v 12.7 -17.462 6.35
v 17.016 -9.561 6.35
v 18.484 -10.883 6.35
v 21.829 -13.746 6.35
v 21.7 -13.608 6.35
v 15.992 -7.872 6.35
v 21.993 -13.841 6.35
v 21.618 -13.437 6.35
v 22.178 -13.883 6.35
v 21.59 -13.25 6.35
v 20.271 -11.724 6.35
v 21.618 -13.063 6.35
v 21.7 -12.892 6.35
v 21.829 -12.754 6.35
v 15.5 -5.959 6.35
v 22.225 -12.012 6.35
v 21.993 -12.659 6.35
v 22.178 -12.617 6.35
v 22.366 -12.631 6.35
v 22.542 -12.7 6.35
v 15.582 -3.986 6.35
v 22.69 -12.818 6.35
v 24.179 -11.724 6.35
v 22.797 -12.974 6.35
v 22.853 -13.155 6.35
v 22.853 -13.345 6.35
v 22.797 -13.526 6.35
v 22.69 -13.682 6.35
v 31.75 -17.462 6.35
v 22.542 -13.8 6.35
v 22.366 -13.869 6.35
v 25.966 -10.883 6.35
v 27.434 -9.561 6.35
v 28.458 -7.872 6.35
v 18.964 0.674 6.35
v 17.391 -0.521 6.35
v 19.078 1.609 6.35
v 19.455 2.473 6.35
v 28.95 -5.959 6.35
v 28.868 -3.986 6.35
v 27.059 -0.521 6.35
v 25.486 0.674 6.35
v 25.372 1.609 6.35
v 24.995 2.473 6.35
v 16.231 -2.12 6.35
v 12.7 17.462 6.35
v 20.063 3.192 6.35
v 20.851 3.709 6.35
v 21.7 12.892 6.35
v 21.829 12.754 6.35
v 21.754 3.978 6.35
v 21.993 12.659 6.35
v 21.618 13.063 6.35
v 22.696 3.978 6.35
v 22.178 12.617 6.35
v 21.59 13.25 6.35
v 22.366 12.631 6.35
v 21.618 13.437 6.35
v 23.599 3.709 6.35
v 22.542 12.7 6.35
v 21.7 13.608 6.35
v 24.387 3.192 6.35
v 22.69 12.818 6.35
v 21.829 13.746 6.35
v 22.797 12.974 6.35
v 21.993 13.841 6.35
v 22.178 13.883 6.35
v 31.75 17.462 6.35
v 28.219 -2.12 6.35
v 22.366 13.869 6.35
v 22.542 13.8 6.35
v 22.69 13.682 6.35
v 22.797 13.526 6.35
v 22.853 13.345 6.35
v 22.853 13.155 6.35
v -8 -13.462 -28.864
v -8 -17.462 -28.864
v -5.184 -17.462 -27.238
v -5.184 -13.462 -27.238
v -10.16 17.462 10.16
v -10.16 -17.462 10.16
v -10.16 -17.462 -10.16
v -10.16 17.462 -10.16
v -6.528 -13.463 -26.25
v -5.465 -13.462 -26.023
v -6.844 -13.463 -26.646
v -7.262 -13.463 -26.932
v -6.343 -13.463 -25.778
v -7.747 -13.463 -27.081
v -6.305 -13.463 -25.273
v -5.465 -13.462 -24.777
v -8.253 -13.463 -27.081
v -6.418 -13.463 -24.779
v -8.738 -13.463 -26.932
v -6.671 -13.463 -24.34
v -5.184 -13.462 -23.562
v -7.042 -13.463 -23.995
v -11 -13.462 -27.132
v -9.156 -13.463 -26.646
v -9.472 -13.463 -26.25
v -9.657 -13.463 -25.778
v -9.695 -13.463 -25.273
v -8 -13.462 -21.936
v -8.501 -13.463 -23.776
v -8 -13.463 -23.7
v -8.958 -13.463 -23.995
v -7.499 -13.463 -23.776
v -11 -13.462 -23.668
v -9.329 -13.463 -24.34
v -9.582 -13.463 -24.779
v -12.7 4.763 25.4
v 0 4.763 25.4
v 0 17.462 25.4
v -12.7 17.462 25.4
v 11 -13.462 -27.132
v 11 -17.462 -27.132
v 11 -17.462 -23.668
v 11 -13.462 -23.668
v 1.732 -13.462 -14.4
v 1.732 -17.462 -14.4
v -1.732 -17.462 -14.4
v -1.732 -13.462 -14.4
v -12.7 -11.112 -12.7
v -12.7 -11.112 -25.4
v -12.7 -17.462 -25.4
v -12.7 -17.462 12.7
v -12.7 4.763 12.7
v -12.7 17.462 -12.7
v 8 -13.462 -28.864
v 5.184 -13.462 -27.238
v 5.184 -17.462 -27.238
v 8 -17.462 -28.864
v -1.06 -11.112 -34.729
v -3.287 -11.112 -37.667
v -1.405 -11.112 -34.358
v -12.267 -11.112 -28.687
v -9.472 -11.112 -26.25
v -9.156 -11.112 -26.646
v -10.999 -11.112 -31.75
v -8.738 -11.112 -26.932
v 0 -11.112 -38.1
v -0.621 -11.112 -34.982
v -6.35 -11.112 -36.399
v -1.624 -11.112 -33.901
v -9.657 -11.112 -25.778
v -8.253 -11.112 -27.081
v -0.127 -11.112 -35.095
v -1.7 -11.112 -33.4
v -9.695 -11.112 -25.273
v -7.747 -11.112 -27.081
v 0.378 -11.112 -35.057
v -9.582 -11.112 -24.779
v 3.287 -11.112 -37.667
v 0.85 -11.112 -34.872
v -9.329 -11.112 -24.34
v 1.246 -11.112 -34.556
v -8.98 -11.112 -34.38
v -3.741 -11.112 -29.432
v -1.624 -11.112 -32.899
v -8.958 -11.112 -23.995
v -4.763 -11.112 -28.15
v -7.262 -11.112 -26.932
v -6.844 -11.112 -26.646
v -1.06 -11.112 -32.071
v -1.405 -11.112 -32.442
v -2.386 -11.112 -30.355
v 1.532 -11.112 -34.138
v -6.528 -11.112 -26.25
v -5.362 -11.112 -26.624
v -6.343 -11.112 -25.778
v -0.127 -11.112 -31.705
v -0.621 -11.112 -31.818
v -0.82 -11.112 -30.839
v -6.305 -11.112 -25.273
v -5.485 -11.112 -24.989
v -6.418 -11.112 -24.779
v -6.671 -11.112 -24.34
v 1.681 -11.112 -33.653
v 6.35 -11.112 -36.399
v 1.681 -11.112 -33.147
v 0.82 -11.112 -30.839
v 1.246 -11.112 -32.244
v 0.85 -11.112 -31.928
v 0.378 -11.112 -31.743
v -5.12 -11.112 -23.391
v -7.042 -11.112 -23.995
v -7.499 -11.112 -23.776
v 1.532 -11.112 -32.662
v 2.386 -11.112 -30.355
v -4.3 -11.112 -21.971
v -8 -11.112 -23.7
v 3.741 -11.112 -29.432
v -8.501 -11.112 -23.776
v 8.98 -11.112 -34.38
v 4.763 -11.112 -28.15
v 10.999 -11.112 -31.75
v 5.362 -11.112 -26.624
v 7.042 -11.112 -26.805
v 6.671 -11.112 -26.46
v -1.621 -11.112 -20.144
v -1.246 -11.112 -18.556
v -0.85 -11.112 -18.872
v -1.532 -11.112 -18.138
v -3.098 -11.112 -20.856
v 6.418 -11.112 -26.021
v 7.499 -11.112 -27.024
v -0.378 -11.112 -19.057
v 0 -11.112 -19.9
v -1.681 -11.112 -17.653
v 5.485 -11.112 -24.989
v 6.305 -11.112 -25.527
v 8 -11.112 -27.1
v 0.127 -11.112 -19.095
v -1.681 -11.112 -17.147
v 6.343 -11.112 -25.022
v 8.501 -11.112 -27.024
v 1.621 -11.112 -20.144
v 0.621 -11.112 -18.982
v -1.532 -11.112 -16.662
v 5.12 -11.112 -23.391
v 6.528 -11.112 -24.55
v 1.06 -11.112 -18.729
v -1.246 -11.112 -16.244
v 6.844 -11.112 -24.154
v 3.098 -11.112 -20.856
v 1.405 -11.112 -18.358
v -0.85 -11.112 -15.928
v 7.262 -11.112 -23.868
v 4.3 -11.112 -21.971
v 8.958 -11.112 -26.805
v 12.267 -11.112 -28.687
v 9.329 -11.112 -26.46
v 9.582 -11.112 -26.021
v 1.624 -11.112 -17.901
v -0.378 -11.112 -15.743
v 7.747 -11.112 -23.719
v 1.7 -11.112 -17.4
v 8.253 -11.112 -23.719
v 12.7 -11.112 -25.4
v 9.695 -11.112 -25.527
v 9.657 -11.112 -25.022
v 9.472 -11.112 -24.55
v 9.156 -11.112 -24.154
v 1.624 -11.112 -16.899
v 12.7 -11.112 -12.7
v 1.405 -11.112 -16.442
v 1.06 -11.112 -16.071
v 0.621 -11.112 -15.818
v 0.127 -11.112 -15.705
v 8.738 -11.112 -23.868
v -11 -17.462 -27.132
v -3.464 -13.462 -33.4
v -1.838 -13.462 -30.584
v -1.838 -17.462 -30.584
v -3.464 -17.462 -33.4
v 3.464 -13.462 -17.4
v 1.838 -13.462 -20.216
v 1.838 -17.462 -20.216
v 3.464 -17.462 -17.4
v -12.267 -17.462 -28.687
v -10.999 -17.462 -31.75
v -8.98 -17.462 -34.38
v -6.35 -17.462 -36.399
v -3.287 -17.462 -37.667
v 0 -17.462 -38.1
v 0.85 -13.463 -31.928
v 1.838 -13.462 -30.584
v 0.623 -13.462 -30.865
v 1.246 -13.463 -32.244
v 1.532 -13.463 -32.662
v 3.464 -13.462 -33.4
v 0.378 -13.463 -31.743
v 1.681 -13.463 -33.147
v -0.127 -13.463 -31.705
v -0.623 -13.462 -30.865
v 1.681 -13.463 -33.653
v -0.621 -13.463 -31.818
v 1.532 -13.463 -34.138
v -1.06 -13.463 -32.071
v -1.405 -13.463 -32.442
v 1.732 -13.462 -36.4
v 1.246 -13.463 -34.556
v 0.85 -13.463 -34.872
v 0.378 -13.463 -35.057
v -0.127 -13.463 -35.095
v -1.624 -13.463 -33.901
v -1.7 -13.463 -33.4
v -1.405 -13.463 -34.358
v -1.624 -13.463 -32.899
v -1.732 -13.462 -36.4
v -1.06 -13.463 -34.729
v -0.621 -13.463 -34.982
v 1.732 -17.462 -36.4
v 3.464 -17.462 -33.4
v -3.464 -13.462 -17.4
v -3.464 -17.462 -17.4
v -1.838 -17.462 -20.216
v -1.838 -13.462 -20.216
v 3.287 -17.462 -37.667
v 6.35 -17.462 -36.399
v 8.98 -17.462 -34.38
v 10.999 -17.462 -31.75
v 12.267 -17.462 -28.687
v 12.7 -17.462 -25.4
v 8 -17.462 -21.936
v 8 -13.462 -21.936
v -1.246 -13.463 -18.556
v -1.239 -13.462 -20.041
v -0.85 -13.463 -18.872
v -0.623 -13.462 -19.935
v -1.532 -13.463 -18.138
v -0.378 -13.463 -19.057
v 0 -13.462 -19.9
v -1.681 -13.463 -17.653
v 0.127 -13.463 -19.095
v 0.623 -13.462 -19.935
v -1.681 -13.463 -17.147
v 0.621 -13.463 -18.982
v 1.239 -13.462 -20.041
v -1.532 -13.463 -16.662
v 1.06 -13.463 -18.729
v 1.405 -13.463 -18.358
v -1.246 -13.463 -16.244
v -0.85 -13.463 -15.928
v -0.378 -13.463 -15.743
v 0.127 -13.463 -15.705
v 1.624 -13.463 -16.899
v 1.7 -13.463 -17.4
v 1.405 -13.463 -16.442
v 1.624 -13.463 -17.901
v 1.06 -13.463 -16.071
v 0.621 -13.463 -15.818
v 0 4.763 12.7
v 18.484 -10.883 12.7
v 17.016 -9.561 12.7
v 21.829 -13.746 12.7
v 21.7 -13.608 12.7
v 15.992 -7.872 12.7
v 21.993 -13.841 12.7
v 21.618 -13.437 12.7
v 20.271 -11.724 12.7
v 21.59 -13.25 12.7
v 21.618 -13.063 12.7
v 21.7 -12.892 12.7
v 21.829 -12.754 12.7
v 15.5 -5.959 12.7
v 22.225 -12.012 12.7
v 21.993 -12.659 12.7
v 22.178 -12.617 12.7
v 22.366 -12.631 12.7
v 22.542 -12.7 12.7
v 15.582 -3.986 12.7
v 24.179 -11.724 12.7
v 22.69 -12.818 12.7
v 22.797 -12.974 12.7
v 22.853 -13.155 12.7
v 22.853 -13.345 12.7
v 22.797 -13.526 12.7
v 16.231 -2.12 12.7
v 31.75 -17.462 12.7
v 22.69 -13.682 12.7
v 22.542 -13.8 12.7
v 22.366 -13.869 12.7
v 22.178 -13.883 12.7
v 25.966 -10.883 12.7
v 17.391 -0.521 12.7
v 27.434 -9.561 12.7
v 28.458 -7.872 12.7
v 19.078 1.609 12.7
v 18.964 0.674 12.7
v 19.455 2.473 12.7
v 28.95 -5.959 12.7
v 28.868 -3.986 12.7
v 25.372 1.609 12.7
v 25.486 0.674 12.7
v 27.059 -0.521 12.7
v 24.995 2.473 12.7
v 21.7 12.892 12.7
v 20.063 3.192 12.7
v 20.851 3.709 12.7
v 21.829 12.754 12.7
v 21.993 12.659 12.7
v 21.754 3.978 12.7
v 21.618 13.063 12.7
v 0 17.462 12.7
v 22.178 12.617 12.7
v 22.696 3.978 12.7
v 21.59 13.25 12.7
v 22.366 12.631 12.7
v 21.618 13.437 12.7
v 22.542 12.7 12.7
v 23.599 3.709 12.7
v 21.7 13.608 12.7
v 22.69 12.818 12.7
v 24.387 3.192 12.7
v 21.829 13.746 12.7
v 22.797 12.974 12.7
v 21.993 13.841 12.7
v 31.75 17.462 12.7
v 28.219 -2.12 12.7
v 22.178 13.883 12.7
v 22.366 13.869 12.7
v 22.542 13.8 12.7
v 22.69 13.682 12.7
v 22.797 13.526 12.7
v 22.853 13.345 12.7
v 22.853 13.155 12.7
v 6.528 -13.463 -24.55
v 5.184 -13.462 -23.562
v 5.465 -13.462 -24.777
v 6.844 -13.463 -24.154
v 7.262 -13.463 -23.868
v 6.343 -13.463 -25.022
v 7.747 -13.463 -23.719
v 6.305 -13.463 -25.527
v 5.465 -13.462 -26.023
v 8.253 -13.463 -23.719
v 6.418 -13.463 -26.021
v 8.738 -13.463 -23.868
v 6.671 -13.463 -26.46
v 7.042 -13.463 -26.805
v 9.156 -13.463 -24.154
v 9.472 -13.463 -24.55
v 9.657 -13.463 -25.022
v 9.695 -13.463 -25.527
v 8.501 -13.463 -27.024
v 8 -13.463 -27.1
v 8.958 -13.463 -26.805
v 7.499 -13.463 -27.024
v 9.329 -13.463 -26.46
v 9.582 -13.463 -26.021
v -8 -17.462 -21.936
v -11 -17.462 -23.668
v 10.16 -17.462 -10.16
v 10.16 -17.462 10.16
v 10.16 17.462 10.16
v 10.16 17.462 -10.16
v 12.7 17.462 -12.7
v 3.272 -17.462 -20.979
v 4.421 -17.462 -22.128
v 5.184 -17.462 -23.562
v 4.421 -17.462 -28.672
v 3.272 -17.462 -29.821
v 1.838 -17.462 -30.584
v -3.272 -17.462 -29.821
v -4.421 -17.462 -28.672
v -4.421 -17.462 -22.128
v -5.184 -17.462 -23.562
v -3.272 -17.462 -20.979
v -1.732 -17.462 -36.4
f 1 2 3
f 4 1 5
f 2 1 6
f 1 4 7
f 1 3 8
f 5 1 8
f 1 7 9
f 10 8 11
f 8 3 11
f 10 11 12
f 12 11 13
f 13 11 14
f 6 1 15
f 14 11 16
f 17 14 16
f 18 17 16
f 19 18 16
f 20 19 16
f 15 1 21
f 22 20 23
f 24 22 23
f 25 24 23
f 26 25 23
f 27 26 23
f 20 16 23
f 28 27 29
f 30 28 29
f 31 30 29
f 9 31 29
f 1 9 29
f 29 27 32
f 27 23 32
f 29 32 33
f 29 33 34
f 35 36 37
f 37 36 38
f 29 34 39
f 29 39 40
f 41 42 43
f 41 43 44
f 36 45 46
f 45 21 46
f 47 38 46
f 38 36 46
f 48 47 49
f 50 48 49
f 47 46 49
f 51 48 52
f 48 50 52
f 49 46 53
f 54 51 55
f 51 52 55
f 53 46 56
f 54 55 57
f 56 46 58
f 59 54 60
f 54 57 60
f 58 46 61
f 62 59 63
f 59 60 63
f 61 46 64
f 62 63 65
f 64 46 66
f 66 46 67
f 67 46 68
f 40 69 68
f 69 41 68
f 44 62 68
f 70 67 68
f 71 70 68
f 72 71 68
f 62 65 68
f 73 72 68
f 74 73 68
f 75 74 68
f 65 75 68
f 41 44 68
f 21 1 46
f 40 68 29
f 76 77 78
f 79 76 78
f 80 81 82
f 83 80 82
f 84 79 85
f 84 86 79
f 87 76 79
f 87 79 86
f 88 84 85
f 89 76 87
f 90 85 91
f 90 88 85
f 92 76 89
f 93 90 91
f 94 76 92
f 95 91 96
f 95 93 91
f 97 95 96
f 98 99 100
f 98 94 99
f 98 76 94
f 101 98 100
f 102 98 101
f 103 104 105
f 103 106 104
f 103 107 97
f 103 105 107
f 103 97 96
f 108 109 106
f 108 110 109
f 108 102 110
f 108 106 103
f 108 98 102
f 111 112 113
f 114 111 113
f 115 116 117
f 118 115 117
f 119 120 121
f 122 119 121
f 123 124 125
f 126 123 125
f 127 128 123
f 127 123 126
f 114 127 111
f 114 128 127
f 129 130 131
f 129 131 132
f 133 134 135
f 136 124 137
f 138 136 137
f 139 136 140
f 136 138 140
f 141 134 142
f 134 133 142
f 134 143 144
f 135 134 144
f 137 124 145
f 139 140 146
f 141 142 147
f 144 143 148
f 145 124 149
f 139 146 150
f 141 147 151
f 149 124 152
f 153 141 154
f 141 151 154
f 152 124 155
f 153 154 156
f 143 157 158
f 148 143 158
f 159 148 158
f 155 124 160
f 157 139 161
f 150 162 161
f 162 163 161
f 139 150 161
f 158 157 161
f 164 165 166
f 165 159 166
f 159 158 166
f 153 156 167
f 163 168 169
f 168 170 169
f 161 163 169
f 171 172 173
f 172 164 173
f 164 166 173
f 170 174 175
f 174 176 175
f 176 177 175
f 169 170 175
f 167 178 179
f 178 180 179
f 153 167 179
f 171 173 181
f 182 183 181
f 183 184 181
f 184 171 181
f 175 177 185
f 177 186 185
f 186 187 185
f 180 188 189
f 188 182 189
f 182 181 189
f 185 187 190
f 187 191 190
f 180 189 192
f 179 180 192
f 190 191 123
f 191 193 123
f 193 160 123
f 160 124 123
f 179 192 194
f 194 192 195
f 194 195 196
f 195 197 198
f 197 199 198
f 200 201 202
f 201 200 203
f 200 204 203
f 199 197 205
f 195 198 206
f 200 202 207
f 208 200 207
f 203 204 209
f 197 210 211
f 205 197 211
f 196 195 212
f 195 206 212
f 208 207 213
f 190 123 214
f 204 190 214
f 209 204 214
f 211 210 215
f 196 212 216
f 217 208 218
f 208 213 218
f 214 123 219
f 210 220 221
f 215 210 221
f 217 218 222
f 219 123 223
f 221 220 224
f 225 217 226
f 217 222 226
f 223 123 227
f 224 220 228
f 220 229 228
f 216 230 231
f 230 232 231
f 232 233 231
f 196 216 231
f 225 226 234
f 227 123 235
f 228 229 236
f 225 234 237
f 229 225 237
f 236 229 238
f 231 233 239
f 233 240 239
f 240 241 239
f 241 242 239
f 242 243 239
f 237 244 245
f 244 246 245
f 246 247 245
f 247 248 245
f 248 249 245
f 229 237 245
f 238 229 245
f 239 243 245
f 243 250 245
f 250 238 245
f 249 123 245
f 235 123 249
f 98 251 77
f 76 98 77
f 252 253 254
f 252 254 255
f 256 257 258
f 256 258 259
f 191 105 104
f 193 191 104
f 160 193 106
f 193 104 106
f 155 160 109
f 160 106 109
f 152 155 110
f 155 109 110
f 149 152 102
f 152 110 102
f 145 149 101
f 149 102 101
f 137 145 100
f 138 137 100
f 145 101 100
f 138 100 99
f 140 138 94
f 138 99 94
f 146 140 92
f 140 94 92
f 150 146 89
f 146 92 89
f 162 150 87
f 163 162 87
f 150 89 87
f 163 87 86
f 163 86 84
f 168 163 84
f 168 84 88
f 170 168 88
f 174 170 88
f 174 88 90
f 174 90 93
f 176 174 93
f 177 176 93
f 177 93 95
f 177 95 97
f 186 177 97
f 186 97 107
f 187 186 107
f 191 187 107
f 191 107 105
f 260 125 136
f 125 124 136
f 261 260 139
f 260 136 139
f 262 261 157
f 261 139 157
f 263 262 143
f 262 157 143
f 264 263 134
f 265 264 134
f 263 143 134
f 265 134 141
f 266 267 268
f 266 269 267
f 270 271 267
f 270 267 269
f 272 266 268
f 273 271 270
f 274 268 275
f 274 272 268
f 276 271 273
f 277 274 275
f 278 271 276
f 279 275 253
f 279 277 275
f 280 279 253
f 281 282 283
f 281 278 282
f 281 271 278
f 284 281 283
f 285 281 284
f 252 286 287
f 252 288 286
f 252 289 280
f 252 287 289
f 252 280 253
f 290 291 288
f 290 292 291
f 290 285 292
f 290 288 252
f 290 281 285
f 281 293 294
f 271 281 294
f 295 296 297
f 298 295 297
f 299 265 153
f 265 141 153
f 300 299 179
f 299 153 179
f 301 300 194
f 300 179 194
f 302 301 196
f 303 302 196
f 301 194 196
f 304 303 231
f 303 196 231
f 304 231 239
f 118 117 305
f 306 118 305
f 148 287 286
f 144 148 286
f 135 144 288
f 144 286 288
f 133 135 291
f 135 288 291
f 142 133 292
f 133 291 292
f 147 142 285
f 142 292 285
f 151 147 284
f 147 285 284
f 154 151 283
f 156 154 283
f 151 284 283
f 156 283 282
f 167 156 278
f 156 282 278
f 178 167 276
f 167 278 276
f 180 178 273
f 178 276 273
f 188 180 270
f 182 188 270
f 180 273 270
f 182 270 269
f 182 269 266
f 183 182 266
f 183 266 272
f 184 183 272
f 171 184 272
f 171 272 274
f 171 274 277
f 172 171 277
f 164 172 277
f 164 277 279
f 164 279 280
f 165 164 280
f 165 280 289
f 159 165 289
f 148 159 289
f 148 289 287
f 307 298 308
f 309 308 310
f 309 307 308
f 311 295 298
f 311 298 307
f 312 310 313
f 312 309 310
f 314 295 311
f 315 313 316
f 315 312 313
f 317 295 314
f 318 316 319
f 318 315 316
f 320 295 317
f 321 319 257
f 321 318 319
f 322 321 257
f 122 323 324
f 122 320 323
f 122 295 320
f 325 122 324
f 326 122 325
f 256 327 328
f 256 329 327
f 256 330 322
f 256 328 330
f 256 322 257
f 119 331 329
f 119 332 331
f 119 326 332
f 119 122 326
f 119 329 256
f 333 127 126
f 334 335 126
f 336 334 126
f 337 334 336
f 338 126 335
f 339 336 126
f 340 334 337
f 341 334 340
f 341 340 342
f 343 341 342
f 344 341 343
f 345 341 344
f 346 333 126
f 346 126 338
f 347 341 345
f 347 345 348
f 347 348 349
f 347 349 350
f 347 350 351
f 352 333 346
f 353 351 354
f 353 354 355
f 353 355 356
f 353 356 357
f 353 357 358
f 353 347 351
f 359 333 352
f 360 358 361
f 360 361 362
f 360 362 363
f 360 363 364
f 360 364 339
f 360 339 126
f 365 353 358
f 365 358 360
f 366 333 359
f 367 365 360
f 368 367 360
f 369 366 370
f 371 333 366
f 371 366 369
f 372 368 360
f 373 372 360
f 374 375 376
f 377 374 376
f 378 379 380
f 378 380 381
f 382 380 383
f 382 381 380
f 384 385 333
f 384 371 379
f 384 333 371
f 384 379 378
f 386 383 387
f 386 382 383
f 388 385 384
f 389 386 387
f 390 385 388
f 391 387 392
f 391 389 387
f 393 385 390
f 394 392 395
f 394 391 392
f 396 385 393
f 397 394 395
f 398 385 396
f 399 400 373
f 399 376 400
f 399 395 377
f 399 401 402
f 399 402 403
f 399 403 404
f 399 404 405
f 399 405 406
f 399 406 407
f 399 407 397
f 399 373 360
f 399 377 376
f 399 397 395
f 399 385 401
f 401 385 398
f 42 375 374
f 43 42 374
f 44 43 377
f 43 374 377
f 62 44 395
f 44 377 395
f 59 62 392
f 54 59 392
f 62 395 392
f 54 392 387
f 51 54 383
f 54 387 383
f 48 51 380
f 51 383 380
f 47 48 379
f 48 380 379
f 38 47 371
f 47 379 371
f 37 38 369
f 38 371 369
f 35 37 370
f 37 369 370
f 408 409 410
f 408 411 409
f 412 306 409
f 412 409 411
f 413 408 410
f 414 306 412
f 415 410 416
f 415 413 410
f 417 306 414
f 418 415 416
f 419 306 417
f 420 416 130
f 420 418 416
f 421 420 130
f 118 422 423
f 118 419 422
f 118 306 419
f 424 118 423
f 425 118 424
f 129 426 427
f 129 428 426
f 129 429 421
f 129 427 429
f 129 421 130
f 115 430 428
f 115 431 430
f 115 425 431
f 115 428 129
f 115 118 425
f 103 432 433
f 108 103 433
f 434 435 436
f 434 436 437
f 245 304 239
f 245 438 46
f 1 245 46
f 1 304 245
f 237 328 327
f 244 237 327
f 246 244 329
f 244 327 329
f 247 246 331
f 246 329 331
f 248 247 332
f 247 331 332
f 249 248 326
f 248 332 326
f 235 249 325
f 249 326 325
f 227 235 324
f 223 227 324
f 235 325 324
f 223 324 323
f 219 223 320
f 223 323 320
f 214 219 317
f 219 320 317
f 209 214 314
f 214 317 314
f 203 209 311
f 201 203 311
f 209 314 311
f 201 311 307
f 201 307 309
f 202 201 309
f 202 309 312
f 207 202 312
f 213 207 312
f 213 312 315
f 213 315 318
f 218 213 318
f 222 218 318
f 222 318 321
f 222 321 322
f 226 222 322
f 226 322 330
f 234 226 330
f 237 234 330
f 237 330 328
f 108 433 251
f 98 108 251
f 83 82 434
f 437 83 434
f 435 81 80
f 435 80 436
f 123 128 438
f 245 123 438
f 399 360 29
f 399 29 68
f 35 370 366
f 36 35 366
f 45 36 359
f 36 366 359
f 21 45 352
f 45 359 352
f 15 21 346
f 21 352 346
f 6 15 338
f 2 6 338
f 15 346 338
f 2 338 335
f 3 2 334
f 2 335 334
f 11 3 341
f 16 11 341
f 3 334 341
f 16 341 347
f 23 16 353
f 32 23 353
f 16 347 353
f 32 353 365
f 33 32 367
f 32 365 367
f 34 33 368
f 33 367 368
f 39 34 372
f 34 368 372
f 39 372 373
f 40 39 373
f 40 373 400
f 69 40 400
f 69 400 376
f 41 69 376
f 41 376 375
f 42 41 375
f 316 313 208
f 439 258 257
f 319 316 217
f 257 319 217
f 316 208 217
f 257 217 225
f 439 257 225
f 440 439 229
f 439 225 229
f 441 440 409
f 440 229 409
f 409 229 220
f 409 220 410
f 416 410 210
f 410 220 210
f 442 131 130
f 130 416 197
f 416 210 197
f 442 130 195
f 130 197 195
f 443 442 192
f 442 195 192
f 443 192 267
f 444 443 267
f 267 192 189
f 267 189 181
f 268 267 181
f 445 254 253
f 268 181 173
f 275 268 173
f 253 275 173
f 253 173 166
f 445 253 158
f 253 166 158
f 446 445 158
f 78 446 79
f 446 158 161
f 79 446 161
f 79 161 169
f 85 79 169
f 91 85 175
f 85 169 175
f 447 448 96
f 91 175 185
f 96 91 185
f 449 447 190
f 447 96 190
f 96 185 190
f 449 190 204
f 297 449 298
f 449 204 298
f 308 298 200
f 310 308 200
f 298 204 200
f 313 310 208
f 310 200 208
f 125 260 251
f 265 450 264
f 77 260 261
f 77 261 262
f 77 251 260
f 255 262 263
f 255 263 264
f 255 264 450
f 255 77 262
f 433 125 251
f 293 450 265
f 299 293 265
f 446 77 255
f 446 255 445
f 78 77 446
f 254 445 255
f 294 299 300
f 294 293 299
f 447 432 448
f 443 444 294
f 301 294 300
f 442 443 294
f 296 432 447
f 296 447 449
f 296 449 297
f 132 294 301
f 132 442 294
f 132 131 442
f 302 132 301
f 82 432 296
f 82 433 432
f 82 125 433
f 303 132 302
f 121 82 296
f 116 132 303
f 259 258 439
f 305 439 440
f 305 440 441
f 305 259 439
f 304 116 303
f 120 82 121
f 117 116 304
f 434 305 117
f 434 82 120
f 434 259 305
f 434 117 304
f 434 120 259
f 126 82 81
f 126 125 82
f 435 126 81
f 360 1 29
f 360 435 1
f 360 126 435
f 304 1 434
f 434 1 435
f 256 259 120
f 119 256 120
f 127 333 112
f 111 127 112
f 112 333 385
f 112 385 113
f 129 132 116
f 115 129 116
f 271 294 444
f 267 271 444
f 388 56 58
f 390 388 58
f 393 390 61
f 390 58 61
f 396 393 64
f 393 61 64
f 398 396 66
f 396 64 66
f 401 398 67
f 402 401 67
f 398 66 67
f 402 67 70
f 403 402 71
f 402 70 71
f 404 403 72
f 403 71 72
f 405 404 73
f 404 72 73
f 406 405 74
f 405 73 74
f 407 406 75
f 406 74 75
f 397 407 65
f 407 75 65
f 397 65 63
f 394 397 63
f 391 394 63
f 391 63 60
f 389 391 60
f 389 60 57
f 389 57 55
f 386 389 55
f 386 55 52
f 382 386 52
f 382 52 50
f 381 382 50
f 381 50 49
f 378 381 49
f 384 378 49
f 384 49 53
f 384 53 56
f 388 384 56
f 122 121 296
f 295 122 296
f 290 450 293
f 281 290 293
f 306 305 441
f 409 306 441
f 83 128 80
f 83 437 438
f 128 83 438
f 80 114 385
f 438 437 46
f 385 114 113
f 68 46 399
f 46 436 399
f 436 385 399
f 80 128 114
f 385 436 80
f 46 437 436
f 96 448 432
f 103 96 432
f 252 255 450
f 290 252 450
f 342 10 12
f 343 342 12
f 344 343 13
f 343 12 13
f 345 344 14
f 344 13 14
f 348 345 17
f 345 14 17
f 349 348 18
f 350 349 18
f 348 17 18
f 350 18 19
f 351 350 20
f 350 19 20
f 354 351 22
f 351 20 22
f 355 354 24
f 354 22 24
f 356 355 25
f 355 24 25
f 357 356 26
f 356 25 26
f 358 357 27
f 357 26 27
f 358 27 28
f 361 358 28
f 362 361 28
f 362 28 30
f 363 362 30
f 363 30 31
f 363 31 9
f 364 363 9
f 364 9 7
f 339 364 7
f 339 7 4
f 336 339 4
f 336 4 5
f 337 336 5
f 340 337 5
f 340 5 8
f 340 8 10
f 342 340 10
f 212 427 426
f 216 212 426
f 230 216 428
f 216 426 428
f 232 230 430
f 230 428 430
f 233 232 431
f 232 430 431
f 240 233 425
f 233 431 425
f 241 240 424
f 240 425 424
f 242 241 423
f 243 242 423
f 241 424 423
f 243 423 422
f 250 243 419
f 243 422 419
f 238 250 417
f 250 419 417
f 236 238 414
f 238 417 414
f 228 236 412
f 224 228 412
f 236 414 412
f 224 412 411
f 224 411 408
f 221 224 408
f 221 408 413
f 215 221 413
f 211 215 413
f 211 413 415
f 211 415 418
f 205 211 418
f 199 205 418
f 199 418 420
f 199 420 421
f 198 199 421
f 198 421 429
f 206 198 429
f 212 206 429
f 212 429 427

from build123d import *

# Parameters (mm, degrees)
SKETCH1_W            = 25.4
SKETCH1_H            = 25.4
SKETCH1_W_2          = 20.32
SKETCH1_H_2          = 20.32
BOSS_EXTRUDE1_DEPTH  = 17.4625
SKETCH4_W            = 25.4
SKETCH4_H            = 25.4
BOSS_EXTRUDE2_DEPTH  = 6.35
CUT_EXTRUDE1_REACH   = 51.289
SKETCH6_R            = 5.5
FILLET1_R            = 12.7
M3_CLEARANCE_HOLE1_D = 3.4
CIRPATTERN1_COUNT    = 4
CUT_EXTRUDE2_DEPTH   = 4
CIRPATTERN2_COUNT    = 4
SKETCH12_W           = 19.05
SKETCH12_H           = 34.925
BOSS_EXTRUDE3_DEPTH  = 6.35
SKETCH13_W           = 12.7
SKETCH13_H           = 12.7
BOSS_EXTRUDE4_DEPTH  = 12.7
CUT_EXTRUDE3_REACH   = 59.348
SKETCH15_R           = 0.635
CUT_EXTRUDE4_REACH   = 64.399


with BuildPart() as part:
    # Sketch1 → Boss-Extrude1 (new, symmetric)
    with BuildSketch(Plane(origin=(0, 0, 0), x_dir=(1, 0, 0), z_dir=(0, 1, 0))):
        Rectangle(SKETCH1_W, SKETCH1_H)
        Rectangle(SKETCH1_W_2, SKETCH1_H_2, mode=Mode.SUBTRACT)
    extrude(amount=BOSS_EXTRUDE1_DEPTH, both=True)

    # Sketch4 → Boss-Extrude2 (add)
    with BuildSketch(Plane.XZ.offset(17.4625)):
        with Locations((0, -25.4)):
            Rectangle(SKETCH4_W, SKETCH4_H)
    extrude(amount=-BOSS_EXTRUDE2_DEPTH)

    # Sketch6 → Cut-Extrude1 (cut, up to next)
    with BuildSketch(Plane(origin=(0, -11.1125, 0), x_dir=(1, 0, 0), z_dir=(0, 1, 0)), mode=Mode.PRIVATE) as cut_extrude1_sk1:
        with Locations(Location((0, 25.4, 0), (0, 0, 270))):
            Circle(SKETCH6_R)
    cut_extrude1_tool1 = extrude(cut_extrude1_sk1.sketch, amount=-CUT_EXTRUDE1_REACH, mode=Mode.PRIVATE) & part.part
    add(cut_extrude1_tool1.solids().sort_by_distance((0, -11.1125, -25.4))[0], mode=Mode.SUBTRACT)

    # Fillet1
    fillet1_edges = [part.edges().sort_by_distance(p)[0] for p in [
        (-12.7, -14.2875, -38.1),
        (12.7, -14.2875, -38.1),
    ]]
    fillet(fillet1_edges, radius=FILLET1_R - 0.0001)  # a hair under: the kernel refuses the full size

    # M3 Clearance Hole1 (through all)
    with Locations(Plane(origin=(0, -11.1125, 0), x_dir=(1, 0, 0), z_dir=(0, 1, 0))):
        with Locations((0, 33.4)):
            m3_clearance_hole1 = Hole(M3_CLEARANCE_HOLE1_D / 2)

    # CirPattern1: M3 Clearance Hole1 ×4 about axis
    cirpattern1_axis = Axis((0, 0, -25.4), (0, 1, 0))
    for i in range(1, CIRPATTERN1_COUNT):
        add(m3_clearance_hole1.rotate(cirpattern1_axis, i * 360 / CIRPATTERN1_COUNT), mode=Mode.SUBTRACT)

    # Sketch11 → Cut-Extrude2 (cut)
    with BuildSketch(Plane.XZ.offset(17.4625)):
        Polygon((1.732050808, -14.4), (-1.732050808, -14.4), (-3.464101615, -17.4), (-1.732050808, -20.4), (1.732050808, -20.4), (3.464101615, -17.4), align=None)
    cut_extrude2 = extrude(amount=-CUT_EXTRUDE2_DEPTH, mode=Mode.SUBTRACT)

    # CirPattern2: Cut-Extrude2 ×4 about axis
    cirpattern2_axis = Axis((0, 0, -25.4), (0, 1, 0))
    for i in range(1, CIRPATTERN2_COUNT):
        add(cut_extrude2.rotate(cirpattern2_axis, i * 360 / CIRPATTERN2_COUNT), mode=Mode.SUBTRACT)

    # Sketch12 → Boss-Extrude3 (add)
    with BuildSketch(Plane.XY.offset(12.7)):
        with Locations((22.225, 0)):
            Rectangle(SKETCH12_W, SKETCH12_H)
    extrude(amount=-BOSS_EXTRUDE3_DEPTH)

    # Sketch13 → Boss-Extrude4 (add)
    with BuildSketch(Plane.ZY.offset(12.7)):
        with Locations((19.05, 11.1125)):
            Rectangle(SKETCH13_W, SKETCH13_H)
    extrude(amount=-BOSS_EXTRUDE4_DEPTH)

    # Sketch15 → Cut-Extrude3 (cut, up to next)
    with BuildSketch(Plane(origin=(0, 0, 6.35), x_dir=(-1, 0, 0), z_dir=(0, 0, -1)), mode=Mode.PRIVATE) as cut_extrude3_sk1:
        with Locations((-22.225, 13.25)):
            Circle(SKETCH15_R)
    cut_extrude3_tool1 = extrude(cut_extrude3_sk1.sketch, amount=-CUT_EXTRUDE3_REACH, mode=Mode.PRIVATE) & part.part
    # Sketch15 → Cut-Extrude3 (cut, up to next)
    with BuildSketch(Plane(origin=(0, 0, 6.35), x_dir=(-1, 0, 0), z_dir=(0, 0, -1)), mode=Mode.PRIVATE) as cut_extrude3_sk2:
        with Locations((-22.225, -13.25)):
            Circle(SKETCH15_R)
    cut_extrude3_tool2 = extrude(cut_extrude3_sk2.sketch, amount=-CUT_EXTRUDE3_REACH, mode=Mode.PRIVATE) & part.part
    add(cut_extrude3_tool1.solids().sort_by_distance((22.225, 13.25, 6.35))[0], mode=Mode.SUBTRACT)
    add(cut_extrude3_tool2.solids().sort_by_distance((22.225, -13.25, 6.35))[0], mode=Mode.SUBTRACT)

    # Sketch16 → Cut-Extrude4 (cut, up to next)
    with BuildSketch(Plane.XY.offset(12.7), mode=Mode.PRIVATE) as cut_extrude4_sk1:
        with BuildLine():
            ThreePointArc((18.963893252, 0.673666667), (22.225, -12.012), (25.486106748, 0.673666667))
            ThreePointArc((25.486106748, 0.673666667), (22.225, 4.012), (18.963893252, 0.673666667))
        make_face()
    cut_extrude4_tool1 = extrude(cut_extrude4_sk1.sketch, amount=-CUT_EXTRUDE4_REACH, mode=Mode.PRIVATE) & part.part
    add(cut_extrude4_tool1.solids().sort_by_distance((22.225, -4.592909, 12.7))[0], mode=Mode.SUBTRACT)


solid = part.part
